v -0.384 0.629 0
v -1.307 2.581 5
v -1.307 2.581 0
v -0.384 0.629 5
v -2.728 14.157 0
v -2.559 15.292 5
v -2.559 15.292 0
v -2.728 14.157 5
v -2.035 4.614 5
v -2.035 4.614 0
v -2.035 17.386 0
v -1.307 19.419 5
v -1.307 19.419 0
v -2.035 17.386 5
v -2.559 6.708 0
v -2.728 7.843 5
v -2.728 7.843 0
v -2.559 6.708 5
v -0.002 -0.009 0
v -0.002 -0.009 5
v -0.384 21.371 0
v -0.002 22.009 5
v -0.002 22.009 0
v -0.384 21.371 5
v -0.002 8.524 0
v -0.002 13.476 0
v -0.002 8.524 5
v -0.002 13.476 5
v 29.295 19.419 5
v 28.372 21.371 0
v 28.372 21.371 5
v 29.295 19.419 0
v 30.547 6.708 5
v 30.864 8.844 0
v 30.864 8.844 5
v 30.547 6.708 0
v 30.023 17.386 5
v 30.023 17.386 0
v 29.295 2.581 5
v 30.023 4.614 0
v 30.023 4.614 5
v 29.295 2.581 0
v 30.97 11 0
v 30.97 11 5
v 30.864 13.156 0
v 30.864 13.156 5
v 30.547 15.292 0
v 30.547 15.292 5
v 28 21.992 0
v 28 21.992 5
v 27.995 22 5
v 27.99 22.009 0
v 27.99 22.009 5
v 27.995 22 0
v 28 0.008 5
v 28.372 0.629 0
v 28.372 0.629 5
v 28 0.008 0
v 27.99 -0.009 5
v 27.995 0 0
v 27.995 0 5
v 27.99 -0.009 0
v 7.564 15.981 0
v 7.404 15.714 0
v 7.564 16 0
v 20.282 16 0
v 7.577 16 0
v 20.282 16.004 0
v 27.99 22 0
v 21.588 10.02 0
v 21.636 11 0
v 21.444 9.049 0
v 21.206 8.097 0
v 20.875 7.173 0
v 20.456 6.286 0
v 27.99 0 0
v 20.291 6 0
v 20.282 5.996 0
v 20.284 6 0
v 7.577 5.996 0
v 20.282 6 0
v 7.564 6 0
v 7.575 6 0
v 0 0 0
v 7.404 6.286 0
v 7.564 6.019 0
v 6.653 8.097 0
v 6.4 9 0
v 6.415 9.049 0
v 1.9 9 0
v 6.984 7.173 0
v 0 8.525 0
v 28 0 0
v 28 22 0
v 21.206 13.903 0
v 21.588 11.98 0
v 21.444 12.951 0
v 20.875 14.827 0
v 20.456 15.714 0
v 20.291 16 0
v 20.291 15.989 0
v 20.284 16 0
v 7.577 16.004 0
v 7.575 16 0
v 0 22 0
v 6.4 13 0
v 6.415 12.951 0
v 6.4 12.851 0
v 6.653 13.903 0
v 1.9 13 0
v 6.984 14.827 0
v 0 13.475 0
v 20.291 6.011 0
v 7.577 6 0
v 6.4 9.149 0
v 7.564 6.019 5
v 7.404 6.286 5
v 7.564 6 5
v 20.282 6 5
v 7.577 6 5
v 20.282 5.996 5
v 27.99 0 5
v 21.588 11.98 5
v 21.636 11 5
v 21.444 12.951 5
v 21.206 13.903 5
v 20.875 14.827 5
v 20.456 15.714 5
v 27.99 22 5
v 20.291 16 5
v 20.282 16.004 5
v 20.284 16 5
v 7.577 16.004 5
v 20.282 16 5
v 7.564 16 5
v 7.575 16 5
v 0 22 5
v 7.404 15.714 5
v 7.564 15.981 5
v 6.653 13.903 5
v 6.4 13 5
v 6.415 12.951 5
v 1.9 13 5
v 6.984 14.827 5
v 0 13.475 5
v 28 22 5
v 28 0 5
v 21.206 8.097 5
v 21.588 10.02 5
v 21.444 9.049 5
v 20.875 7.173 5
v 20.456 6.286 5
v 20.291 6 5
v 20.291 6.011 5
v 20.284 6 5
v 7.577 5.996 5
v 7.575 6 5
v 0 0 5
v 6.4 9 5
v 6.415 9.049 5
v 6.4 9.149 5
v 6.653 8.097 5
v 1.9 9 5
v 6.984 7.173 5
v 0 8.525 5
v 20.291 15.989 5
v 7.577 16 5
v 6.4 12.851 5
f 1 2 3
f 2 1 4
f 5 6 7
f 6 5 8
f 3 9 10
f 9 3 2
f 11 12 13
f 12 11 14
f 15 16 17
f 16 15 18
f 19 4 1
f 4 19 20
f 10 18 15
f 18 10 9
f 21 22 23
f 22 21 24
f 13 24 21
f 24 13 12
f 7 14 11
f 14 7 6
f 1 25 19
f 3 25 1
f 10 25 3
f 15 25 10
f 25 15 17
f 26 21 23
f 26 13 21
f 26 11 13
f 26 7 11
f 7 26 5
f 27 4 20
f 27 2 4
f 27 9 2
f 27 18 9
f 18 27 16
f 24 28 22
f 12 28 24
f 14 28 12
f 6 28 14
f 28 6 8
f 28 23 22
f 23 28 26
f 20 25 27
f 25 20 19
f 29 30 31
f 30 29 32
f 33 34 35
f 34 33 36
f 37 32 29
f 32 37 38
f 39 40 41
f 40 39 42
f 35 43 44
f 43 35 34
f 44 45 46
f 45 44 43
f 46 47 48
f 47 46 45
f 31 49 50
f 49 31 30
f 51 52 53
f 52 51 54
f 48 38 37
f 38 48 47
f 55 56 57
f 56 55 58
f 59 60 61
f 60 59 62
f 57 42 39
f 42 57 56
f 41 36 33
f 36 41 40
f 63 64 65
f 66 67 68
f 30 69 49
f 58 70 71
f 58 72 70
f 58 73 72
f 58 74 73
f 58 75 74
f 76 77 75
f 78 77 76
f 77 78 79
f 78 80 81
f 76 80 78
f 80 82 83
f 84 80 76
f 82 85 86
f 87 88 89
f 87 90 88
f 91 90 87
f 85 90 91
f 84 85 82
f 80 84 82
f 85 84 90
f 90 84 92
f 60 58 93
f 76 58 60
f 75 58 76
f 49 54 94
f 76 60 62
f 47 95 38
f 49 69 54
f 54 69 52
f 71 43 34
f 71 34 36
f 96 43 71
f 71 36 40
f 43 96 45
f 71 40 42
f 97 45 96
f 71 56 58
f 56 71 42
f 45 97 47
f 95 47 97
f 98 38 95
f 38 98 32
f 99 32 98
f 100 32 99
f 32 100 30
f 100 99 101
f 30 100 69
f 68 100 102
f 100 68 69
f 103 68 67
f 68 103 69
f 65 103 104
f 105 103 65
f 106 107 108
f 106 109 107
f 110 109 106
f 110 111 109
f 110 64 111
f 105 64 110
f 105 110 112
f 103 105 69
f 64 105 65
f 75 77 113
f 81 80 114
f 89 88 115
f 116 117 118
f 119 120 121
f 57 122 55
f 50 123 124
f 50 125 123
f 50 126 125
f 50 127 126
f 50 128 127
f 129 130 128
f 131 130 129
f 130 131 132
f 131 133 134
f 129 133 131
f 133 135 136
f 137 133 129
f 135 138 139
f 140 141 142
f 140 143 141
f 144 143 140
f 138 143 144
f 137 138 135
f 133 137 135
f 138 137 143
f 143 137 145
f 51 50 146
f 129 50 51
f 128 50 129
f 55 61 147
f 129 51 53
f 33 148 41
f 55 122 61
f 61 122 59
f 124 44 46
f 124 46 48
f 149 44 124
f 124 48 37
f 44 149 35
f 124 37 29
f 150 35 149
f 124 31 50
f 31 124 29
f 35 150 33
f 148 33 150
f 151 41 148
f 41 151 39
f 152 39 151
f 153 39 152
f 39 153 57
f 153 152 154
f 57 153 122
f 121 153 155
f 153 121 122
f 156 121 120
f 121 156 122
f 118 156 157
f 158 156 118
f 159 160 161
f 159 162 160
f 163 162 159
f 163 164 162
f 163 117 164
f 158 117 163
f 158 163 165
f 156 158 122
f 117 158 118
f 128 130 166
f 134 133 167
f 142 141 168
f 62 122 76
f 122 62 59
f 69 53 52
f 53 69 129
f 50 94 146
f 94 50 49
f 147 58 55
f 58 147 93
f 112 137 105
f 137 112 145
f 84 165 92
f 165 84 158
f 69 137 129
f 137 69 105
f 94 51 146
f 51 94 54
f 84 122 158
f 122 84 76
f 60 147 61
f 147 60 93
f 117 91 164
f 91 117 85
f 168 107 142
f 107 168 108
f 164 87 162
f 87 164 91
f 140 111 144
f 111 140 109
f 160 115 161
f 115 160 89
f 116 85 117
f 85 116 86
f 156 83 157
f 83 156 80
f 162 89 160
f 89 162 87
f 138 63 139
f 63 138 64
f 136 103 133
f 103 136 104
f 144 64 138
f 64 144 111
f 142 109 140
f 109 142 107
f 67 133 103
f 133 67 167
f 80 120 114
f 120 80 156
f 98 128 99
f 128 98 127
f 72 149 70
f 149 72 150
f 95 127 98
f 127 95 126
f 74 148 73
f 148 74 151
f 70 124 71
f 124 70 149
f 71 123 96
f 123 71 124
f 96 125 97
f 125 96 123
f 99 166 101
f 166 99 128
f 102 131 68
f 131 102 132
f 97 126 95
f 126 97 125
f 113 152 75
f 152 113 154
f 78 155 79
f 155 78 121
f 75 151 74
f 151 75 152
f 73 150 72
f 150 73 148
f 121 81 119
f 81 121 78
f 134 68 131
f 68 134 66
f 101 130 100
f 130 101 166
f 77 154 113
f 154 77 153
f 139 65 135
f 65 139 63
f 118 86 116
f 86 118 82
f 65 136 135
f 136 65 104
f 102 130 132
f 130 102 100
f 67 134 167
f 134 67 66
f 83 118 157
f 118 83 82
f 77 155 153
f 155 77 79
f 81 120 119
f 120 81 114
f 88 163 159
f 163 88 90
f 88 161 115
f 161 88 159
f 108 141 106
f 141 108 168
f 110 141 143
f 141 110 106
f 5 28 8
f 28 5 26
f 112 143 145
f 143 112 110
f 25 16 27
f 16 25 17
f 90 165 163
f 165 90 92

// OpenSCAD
module shape() {
    polygon([[0,0],[1,0],[1.5,1],[2.5,1],[2,-1],[0,-1]]);
}


innerlen=28;
outerheight=22;
thick=5;
scf=0.454545455;
innerheight=10;

$fn=64;
module make(){
    cyr=outerheight/2*2;
    difference(){
        union(){
            translate([19.018,cyr/2,0]) cutcyl(cyr,thick,12.68,[0,0,-90]);
            cube([innerlen,outerheight,thick]);       
            translate([innerlen-cyr/2-8.03,cyr/2,0]) cutcyl(cyr,thick,12.68,[0,0,90]);
        }
        translate([innerlen/2*scf+1.2,outerheight/2-innerheight/2,-0.5]) scale([scf,scf,1.2]) union(){
            translate([19.05,cyr/2,0]) cutcyl(cyr,thick,12.68,[0,0,-90]);
            cube([innerlen,outerheight,thick]);       
            translate([innerlen-cyr/2-8.04,cyr/2,0]) cutcyl(cyr,thick,12.68,[0,0,90]);
        }  
        translate([1.9,outerheight/2,-0.1]) 
         linear_extrude(height=thick*1.2) 
          polygon(points=[[-6,-3.5],[-6,3.5],[0,2],[4.5,2],[4.5,-2],[0,-2]] );
    }
}

make();
//inset(d=0.3) shape();

// outset(d=0.3) shape();

// rounding(r=0.3) shape();

//fillet(r=0.3) shape();

// shell(d=0.3) shape();

// shell(d=-0.3) shape();

// shell(d=0.3,center=true) shape();

module cutcyla(r,h,cutr=[0,0,0]){
   rotate(cutr) render() difference(){
		cylinder(r=r,h=h);
   	    translate([0,r/2+0.1,h/2]) cube([r*2,r+0.2,h],center=true);
	}
}

module cutcyl(r,h,cutofs,cutr=[0,0,0]){
   rotate(cutr) render() difference(){
			cylinder(r=r,h=h);
   	        translate([0,r/2-cutofs/2,h/2]) cube([r*2,r+cutofs*2,h],center=true);
	}
}

/* 
 * Excerpt from... 
 * 
 * Parametric Encoder Wheel 
 *
 * by Alex Franke (codecreations), March 2012
 * http://www.theFrankes.com
 * 
 * Licenced under Creative Commons Attribution - Non-Commercial - Share Alike 3.0 
*/
 
module arc( height, depth, radius, degrees ) {
    // This dies a horible death if it's not rendered here 
    // -- sucks up all memory and spins out of control 
    render() {
        difference() {
            // Outer ring
            rotate_extrude($fn = 100)
                translate([radius - height, 0, 0])
                    square([height,depth]);
         
            // Cut half off
            translate([0,-(radius+1),-.5]) 
                cube ([radius+1,(radius+1)*2,depth+1]);
         
            // Cover the other half as necessary
            rotate([0,0,180-degrees])
            translate([0,-(radius+1),-.5]) 
                cube ([radius+1,(radius+1)*2,depth+1]);
         
        }
    }
}
